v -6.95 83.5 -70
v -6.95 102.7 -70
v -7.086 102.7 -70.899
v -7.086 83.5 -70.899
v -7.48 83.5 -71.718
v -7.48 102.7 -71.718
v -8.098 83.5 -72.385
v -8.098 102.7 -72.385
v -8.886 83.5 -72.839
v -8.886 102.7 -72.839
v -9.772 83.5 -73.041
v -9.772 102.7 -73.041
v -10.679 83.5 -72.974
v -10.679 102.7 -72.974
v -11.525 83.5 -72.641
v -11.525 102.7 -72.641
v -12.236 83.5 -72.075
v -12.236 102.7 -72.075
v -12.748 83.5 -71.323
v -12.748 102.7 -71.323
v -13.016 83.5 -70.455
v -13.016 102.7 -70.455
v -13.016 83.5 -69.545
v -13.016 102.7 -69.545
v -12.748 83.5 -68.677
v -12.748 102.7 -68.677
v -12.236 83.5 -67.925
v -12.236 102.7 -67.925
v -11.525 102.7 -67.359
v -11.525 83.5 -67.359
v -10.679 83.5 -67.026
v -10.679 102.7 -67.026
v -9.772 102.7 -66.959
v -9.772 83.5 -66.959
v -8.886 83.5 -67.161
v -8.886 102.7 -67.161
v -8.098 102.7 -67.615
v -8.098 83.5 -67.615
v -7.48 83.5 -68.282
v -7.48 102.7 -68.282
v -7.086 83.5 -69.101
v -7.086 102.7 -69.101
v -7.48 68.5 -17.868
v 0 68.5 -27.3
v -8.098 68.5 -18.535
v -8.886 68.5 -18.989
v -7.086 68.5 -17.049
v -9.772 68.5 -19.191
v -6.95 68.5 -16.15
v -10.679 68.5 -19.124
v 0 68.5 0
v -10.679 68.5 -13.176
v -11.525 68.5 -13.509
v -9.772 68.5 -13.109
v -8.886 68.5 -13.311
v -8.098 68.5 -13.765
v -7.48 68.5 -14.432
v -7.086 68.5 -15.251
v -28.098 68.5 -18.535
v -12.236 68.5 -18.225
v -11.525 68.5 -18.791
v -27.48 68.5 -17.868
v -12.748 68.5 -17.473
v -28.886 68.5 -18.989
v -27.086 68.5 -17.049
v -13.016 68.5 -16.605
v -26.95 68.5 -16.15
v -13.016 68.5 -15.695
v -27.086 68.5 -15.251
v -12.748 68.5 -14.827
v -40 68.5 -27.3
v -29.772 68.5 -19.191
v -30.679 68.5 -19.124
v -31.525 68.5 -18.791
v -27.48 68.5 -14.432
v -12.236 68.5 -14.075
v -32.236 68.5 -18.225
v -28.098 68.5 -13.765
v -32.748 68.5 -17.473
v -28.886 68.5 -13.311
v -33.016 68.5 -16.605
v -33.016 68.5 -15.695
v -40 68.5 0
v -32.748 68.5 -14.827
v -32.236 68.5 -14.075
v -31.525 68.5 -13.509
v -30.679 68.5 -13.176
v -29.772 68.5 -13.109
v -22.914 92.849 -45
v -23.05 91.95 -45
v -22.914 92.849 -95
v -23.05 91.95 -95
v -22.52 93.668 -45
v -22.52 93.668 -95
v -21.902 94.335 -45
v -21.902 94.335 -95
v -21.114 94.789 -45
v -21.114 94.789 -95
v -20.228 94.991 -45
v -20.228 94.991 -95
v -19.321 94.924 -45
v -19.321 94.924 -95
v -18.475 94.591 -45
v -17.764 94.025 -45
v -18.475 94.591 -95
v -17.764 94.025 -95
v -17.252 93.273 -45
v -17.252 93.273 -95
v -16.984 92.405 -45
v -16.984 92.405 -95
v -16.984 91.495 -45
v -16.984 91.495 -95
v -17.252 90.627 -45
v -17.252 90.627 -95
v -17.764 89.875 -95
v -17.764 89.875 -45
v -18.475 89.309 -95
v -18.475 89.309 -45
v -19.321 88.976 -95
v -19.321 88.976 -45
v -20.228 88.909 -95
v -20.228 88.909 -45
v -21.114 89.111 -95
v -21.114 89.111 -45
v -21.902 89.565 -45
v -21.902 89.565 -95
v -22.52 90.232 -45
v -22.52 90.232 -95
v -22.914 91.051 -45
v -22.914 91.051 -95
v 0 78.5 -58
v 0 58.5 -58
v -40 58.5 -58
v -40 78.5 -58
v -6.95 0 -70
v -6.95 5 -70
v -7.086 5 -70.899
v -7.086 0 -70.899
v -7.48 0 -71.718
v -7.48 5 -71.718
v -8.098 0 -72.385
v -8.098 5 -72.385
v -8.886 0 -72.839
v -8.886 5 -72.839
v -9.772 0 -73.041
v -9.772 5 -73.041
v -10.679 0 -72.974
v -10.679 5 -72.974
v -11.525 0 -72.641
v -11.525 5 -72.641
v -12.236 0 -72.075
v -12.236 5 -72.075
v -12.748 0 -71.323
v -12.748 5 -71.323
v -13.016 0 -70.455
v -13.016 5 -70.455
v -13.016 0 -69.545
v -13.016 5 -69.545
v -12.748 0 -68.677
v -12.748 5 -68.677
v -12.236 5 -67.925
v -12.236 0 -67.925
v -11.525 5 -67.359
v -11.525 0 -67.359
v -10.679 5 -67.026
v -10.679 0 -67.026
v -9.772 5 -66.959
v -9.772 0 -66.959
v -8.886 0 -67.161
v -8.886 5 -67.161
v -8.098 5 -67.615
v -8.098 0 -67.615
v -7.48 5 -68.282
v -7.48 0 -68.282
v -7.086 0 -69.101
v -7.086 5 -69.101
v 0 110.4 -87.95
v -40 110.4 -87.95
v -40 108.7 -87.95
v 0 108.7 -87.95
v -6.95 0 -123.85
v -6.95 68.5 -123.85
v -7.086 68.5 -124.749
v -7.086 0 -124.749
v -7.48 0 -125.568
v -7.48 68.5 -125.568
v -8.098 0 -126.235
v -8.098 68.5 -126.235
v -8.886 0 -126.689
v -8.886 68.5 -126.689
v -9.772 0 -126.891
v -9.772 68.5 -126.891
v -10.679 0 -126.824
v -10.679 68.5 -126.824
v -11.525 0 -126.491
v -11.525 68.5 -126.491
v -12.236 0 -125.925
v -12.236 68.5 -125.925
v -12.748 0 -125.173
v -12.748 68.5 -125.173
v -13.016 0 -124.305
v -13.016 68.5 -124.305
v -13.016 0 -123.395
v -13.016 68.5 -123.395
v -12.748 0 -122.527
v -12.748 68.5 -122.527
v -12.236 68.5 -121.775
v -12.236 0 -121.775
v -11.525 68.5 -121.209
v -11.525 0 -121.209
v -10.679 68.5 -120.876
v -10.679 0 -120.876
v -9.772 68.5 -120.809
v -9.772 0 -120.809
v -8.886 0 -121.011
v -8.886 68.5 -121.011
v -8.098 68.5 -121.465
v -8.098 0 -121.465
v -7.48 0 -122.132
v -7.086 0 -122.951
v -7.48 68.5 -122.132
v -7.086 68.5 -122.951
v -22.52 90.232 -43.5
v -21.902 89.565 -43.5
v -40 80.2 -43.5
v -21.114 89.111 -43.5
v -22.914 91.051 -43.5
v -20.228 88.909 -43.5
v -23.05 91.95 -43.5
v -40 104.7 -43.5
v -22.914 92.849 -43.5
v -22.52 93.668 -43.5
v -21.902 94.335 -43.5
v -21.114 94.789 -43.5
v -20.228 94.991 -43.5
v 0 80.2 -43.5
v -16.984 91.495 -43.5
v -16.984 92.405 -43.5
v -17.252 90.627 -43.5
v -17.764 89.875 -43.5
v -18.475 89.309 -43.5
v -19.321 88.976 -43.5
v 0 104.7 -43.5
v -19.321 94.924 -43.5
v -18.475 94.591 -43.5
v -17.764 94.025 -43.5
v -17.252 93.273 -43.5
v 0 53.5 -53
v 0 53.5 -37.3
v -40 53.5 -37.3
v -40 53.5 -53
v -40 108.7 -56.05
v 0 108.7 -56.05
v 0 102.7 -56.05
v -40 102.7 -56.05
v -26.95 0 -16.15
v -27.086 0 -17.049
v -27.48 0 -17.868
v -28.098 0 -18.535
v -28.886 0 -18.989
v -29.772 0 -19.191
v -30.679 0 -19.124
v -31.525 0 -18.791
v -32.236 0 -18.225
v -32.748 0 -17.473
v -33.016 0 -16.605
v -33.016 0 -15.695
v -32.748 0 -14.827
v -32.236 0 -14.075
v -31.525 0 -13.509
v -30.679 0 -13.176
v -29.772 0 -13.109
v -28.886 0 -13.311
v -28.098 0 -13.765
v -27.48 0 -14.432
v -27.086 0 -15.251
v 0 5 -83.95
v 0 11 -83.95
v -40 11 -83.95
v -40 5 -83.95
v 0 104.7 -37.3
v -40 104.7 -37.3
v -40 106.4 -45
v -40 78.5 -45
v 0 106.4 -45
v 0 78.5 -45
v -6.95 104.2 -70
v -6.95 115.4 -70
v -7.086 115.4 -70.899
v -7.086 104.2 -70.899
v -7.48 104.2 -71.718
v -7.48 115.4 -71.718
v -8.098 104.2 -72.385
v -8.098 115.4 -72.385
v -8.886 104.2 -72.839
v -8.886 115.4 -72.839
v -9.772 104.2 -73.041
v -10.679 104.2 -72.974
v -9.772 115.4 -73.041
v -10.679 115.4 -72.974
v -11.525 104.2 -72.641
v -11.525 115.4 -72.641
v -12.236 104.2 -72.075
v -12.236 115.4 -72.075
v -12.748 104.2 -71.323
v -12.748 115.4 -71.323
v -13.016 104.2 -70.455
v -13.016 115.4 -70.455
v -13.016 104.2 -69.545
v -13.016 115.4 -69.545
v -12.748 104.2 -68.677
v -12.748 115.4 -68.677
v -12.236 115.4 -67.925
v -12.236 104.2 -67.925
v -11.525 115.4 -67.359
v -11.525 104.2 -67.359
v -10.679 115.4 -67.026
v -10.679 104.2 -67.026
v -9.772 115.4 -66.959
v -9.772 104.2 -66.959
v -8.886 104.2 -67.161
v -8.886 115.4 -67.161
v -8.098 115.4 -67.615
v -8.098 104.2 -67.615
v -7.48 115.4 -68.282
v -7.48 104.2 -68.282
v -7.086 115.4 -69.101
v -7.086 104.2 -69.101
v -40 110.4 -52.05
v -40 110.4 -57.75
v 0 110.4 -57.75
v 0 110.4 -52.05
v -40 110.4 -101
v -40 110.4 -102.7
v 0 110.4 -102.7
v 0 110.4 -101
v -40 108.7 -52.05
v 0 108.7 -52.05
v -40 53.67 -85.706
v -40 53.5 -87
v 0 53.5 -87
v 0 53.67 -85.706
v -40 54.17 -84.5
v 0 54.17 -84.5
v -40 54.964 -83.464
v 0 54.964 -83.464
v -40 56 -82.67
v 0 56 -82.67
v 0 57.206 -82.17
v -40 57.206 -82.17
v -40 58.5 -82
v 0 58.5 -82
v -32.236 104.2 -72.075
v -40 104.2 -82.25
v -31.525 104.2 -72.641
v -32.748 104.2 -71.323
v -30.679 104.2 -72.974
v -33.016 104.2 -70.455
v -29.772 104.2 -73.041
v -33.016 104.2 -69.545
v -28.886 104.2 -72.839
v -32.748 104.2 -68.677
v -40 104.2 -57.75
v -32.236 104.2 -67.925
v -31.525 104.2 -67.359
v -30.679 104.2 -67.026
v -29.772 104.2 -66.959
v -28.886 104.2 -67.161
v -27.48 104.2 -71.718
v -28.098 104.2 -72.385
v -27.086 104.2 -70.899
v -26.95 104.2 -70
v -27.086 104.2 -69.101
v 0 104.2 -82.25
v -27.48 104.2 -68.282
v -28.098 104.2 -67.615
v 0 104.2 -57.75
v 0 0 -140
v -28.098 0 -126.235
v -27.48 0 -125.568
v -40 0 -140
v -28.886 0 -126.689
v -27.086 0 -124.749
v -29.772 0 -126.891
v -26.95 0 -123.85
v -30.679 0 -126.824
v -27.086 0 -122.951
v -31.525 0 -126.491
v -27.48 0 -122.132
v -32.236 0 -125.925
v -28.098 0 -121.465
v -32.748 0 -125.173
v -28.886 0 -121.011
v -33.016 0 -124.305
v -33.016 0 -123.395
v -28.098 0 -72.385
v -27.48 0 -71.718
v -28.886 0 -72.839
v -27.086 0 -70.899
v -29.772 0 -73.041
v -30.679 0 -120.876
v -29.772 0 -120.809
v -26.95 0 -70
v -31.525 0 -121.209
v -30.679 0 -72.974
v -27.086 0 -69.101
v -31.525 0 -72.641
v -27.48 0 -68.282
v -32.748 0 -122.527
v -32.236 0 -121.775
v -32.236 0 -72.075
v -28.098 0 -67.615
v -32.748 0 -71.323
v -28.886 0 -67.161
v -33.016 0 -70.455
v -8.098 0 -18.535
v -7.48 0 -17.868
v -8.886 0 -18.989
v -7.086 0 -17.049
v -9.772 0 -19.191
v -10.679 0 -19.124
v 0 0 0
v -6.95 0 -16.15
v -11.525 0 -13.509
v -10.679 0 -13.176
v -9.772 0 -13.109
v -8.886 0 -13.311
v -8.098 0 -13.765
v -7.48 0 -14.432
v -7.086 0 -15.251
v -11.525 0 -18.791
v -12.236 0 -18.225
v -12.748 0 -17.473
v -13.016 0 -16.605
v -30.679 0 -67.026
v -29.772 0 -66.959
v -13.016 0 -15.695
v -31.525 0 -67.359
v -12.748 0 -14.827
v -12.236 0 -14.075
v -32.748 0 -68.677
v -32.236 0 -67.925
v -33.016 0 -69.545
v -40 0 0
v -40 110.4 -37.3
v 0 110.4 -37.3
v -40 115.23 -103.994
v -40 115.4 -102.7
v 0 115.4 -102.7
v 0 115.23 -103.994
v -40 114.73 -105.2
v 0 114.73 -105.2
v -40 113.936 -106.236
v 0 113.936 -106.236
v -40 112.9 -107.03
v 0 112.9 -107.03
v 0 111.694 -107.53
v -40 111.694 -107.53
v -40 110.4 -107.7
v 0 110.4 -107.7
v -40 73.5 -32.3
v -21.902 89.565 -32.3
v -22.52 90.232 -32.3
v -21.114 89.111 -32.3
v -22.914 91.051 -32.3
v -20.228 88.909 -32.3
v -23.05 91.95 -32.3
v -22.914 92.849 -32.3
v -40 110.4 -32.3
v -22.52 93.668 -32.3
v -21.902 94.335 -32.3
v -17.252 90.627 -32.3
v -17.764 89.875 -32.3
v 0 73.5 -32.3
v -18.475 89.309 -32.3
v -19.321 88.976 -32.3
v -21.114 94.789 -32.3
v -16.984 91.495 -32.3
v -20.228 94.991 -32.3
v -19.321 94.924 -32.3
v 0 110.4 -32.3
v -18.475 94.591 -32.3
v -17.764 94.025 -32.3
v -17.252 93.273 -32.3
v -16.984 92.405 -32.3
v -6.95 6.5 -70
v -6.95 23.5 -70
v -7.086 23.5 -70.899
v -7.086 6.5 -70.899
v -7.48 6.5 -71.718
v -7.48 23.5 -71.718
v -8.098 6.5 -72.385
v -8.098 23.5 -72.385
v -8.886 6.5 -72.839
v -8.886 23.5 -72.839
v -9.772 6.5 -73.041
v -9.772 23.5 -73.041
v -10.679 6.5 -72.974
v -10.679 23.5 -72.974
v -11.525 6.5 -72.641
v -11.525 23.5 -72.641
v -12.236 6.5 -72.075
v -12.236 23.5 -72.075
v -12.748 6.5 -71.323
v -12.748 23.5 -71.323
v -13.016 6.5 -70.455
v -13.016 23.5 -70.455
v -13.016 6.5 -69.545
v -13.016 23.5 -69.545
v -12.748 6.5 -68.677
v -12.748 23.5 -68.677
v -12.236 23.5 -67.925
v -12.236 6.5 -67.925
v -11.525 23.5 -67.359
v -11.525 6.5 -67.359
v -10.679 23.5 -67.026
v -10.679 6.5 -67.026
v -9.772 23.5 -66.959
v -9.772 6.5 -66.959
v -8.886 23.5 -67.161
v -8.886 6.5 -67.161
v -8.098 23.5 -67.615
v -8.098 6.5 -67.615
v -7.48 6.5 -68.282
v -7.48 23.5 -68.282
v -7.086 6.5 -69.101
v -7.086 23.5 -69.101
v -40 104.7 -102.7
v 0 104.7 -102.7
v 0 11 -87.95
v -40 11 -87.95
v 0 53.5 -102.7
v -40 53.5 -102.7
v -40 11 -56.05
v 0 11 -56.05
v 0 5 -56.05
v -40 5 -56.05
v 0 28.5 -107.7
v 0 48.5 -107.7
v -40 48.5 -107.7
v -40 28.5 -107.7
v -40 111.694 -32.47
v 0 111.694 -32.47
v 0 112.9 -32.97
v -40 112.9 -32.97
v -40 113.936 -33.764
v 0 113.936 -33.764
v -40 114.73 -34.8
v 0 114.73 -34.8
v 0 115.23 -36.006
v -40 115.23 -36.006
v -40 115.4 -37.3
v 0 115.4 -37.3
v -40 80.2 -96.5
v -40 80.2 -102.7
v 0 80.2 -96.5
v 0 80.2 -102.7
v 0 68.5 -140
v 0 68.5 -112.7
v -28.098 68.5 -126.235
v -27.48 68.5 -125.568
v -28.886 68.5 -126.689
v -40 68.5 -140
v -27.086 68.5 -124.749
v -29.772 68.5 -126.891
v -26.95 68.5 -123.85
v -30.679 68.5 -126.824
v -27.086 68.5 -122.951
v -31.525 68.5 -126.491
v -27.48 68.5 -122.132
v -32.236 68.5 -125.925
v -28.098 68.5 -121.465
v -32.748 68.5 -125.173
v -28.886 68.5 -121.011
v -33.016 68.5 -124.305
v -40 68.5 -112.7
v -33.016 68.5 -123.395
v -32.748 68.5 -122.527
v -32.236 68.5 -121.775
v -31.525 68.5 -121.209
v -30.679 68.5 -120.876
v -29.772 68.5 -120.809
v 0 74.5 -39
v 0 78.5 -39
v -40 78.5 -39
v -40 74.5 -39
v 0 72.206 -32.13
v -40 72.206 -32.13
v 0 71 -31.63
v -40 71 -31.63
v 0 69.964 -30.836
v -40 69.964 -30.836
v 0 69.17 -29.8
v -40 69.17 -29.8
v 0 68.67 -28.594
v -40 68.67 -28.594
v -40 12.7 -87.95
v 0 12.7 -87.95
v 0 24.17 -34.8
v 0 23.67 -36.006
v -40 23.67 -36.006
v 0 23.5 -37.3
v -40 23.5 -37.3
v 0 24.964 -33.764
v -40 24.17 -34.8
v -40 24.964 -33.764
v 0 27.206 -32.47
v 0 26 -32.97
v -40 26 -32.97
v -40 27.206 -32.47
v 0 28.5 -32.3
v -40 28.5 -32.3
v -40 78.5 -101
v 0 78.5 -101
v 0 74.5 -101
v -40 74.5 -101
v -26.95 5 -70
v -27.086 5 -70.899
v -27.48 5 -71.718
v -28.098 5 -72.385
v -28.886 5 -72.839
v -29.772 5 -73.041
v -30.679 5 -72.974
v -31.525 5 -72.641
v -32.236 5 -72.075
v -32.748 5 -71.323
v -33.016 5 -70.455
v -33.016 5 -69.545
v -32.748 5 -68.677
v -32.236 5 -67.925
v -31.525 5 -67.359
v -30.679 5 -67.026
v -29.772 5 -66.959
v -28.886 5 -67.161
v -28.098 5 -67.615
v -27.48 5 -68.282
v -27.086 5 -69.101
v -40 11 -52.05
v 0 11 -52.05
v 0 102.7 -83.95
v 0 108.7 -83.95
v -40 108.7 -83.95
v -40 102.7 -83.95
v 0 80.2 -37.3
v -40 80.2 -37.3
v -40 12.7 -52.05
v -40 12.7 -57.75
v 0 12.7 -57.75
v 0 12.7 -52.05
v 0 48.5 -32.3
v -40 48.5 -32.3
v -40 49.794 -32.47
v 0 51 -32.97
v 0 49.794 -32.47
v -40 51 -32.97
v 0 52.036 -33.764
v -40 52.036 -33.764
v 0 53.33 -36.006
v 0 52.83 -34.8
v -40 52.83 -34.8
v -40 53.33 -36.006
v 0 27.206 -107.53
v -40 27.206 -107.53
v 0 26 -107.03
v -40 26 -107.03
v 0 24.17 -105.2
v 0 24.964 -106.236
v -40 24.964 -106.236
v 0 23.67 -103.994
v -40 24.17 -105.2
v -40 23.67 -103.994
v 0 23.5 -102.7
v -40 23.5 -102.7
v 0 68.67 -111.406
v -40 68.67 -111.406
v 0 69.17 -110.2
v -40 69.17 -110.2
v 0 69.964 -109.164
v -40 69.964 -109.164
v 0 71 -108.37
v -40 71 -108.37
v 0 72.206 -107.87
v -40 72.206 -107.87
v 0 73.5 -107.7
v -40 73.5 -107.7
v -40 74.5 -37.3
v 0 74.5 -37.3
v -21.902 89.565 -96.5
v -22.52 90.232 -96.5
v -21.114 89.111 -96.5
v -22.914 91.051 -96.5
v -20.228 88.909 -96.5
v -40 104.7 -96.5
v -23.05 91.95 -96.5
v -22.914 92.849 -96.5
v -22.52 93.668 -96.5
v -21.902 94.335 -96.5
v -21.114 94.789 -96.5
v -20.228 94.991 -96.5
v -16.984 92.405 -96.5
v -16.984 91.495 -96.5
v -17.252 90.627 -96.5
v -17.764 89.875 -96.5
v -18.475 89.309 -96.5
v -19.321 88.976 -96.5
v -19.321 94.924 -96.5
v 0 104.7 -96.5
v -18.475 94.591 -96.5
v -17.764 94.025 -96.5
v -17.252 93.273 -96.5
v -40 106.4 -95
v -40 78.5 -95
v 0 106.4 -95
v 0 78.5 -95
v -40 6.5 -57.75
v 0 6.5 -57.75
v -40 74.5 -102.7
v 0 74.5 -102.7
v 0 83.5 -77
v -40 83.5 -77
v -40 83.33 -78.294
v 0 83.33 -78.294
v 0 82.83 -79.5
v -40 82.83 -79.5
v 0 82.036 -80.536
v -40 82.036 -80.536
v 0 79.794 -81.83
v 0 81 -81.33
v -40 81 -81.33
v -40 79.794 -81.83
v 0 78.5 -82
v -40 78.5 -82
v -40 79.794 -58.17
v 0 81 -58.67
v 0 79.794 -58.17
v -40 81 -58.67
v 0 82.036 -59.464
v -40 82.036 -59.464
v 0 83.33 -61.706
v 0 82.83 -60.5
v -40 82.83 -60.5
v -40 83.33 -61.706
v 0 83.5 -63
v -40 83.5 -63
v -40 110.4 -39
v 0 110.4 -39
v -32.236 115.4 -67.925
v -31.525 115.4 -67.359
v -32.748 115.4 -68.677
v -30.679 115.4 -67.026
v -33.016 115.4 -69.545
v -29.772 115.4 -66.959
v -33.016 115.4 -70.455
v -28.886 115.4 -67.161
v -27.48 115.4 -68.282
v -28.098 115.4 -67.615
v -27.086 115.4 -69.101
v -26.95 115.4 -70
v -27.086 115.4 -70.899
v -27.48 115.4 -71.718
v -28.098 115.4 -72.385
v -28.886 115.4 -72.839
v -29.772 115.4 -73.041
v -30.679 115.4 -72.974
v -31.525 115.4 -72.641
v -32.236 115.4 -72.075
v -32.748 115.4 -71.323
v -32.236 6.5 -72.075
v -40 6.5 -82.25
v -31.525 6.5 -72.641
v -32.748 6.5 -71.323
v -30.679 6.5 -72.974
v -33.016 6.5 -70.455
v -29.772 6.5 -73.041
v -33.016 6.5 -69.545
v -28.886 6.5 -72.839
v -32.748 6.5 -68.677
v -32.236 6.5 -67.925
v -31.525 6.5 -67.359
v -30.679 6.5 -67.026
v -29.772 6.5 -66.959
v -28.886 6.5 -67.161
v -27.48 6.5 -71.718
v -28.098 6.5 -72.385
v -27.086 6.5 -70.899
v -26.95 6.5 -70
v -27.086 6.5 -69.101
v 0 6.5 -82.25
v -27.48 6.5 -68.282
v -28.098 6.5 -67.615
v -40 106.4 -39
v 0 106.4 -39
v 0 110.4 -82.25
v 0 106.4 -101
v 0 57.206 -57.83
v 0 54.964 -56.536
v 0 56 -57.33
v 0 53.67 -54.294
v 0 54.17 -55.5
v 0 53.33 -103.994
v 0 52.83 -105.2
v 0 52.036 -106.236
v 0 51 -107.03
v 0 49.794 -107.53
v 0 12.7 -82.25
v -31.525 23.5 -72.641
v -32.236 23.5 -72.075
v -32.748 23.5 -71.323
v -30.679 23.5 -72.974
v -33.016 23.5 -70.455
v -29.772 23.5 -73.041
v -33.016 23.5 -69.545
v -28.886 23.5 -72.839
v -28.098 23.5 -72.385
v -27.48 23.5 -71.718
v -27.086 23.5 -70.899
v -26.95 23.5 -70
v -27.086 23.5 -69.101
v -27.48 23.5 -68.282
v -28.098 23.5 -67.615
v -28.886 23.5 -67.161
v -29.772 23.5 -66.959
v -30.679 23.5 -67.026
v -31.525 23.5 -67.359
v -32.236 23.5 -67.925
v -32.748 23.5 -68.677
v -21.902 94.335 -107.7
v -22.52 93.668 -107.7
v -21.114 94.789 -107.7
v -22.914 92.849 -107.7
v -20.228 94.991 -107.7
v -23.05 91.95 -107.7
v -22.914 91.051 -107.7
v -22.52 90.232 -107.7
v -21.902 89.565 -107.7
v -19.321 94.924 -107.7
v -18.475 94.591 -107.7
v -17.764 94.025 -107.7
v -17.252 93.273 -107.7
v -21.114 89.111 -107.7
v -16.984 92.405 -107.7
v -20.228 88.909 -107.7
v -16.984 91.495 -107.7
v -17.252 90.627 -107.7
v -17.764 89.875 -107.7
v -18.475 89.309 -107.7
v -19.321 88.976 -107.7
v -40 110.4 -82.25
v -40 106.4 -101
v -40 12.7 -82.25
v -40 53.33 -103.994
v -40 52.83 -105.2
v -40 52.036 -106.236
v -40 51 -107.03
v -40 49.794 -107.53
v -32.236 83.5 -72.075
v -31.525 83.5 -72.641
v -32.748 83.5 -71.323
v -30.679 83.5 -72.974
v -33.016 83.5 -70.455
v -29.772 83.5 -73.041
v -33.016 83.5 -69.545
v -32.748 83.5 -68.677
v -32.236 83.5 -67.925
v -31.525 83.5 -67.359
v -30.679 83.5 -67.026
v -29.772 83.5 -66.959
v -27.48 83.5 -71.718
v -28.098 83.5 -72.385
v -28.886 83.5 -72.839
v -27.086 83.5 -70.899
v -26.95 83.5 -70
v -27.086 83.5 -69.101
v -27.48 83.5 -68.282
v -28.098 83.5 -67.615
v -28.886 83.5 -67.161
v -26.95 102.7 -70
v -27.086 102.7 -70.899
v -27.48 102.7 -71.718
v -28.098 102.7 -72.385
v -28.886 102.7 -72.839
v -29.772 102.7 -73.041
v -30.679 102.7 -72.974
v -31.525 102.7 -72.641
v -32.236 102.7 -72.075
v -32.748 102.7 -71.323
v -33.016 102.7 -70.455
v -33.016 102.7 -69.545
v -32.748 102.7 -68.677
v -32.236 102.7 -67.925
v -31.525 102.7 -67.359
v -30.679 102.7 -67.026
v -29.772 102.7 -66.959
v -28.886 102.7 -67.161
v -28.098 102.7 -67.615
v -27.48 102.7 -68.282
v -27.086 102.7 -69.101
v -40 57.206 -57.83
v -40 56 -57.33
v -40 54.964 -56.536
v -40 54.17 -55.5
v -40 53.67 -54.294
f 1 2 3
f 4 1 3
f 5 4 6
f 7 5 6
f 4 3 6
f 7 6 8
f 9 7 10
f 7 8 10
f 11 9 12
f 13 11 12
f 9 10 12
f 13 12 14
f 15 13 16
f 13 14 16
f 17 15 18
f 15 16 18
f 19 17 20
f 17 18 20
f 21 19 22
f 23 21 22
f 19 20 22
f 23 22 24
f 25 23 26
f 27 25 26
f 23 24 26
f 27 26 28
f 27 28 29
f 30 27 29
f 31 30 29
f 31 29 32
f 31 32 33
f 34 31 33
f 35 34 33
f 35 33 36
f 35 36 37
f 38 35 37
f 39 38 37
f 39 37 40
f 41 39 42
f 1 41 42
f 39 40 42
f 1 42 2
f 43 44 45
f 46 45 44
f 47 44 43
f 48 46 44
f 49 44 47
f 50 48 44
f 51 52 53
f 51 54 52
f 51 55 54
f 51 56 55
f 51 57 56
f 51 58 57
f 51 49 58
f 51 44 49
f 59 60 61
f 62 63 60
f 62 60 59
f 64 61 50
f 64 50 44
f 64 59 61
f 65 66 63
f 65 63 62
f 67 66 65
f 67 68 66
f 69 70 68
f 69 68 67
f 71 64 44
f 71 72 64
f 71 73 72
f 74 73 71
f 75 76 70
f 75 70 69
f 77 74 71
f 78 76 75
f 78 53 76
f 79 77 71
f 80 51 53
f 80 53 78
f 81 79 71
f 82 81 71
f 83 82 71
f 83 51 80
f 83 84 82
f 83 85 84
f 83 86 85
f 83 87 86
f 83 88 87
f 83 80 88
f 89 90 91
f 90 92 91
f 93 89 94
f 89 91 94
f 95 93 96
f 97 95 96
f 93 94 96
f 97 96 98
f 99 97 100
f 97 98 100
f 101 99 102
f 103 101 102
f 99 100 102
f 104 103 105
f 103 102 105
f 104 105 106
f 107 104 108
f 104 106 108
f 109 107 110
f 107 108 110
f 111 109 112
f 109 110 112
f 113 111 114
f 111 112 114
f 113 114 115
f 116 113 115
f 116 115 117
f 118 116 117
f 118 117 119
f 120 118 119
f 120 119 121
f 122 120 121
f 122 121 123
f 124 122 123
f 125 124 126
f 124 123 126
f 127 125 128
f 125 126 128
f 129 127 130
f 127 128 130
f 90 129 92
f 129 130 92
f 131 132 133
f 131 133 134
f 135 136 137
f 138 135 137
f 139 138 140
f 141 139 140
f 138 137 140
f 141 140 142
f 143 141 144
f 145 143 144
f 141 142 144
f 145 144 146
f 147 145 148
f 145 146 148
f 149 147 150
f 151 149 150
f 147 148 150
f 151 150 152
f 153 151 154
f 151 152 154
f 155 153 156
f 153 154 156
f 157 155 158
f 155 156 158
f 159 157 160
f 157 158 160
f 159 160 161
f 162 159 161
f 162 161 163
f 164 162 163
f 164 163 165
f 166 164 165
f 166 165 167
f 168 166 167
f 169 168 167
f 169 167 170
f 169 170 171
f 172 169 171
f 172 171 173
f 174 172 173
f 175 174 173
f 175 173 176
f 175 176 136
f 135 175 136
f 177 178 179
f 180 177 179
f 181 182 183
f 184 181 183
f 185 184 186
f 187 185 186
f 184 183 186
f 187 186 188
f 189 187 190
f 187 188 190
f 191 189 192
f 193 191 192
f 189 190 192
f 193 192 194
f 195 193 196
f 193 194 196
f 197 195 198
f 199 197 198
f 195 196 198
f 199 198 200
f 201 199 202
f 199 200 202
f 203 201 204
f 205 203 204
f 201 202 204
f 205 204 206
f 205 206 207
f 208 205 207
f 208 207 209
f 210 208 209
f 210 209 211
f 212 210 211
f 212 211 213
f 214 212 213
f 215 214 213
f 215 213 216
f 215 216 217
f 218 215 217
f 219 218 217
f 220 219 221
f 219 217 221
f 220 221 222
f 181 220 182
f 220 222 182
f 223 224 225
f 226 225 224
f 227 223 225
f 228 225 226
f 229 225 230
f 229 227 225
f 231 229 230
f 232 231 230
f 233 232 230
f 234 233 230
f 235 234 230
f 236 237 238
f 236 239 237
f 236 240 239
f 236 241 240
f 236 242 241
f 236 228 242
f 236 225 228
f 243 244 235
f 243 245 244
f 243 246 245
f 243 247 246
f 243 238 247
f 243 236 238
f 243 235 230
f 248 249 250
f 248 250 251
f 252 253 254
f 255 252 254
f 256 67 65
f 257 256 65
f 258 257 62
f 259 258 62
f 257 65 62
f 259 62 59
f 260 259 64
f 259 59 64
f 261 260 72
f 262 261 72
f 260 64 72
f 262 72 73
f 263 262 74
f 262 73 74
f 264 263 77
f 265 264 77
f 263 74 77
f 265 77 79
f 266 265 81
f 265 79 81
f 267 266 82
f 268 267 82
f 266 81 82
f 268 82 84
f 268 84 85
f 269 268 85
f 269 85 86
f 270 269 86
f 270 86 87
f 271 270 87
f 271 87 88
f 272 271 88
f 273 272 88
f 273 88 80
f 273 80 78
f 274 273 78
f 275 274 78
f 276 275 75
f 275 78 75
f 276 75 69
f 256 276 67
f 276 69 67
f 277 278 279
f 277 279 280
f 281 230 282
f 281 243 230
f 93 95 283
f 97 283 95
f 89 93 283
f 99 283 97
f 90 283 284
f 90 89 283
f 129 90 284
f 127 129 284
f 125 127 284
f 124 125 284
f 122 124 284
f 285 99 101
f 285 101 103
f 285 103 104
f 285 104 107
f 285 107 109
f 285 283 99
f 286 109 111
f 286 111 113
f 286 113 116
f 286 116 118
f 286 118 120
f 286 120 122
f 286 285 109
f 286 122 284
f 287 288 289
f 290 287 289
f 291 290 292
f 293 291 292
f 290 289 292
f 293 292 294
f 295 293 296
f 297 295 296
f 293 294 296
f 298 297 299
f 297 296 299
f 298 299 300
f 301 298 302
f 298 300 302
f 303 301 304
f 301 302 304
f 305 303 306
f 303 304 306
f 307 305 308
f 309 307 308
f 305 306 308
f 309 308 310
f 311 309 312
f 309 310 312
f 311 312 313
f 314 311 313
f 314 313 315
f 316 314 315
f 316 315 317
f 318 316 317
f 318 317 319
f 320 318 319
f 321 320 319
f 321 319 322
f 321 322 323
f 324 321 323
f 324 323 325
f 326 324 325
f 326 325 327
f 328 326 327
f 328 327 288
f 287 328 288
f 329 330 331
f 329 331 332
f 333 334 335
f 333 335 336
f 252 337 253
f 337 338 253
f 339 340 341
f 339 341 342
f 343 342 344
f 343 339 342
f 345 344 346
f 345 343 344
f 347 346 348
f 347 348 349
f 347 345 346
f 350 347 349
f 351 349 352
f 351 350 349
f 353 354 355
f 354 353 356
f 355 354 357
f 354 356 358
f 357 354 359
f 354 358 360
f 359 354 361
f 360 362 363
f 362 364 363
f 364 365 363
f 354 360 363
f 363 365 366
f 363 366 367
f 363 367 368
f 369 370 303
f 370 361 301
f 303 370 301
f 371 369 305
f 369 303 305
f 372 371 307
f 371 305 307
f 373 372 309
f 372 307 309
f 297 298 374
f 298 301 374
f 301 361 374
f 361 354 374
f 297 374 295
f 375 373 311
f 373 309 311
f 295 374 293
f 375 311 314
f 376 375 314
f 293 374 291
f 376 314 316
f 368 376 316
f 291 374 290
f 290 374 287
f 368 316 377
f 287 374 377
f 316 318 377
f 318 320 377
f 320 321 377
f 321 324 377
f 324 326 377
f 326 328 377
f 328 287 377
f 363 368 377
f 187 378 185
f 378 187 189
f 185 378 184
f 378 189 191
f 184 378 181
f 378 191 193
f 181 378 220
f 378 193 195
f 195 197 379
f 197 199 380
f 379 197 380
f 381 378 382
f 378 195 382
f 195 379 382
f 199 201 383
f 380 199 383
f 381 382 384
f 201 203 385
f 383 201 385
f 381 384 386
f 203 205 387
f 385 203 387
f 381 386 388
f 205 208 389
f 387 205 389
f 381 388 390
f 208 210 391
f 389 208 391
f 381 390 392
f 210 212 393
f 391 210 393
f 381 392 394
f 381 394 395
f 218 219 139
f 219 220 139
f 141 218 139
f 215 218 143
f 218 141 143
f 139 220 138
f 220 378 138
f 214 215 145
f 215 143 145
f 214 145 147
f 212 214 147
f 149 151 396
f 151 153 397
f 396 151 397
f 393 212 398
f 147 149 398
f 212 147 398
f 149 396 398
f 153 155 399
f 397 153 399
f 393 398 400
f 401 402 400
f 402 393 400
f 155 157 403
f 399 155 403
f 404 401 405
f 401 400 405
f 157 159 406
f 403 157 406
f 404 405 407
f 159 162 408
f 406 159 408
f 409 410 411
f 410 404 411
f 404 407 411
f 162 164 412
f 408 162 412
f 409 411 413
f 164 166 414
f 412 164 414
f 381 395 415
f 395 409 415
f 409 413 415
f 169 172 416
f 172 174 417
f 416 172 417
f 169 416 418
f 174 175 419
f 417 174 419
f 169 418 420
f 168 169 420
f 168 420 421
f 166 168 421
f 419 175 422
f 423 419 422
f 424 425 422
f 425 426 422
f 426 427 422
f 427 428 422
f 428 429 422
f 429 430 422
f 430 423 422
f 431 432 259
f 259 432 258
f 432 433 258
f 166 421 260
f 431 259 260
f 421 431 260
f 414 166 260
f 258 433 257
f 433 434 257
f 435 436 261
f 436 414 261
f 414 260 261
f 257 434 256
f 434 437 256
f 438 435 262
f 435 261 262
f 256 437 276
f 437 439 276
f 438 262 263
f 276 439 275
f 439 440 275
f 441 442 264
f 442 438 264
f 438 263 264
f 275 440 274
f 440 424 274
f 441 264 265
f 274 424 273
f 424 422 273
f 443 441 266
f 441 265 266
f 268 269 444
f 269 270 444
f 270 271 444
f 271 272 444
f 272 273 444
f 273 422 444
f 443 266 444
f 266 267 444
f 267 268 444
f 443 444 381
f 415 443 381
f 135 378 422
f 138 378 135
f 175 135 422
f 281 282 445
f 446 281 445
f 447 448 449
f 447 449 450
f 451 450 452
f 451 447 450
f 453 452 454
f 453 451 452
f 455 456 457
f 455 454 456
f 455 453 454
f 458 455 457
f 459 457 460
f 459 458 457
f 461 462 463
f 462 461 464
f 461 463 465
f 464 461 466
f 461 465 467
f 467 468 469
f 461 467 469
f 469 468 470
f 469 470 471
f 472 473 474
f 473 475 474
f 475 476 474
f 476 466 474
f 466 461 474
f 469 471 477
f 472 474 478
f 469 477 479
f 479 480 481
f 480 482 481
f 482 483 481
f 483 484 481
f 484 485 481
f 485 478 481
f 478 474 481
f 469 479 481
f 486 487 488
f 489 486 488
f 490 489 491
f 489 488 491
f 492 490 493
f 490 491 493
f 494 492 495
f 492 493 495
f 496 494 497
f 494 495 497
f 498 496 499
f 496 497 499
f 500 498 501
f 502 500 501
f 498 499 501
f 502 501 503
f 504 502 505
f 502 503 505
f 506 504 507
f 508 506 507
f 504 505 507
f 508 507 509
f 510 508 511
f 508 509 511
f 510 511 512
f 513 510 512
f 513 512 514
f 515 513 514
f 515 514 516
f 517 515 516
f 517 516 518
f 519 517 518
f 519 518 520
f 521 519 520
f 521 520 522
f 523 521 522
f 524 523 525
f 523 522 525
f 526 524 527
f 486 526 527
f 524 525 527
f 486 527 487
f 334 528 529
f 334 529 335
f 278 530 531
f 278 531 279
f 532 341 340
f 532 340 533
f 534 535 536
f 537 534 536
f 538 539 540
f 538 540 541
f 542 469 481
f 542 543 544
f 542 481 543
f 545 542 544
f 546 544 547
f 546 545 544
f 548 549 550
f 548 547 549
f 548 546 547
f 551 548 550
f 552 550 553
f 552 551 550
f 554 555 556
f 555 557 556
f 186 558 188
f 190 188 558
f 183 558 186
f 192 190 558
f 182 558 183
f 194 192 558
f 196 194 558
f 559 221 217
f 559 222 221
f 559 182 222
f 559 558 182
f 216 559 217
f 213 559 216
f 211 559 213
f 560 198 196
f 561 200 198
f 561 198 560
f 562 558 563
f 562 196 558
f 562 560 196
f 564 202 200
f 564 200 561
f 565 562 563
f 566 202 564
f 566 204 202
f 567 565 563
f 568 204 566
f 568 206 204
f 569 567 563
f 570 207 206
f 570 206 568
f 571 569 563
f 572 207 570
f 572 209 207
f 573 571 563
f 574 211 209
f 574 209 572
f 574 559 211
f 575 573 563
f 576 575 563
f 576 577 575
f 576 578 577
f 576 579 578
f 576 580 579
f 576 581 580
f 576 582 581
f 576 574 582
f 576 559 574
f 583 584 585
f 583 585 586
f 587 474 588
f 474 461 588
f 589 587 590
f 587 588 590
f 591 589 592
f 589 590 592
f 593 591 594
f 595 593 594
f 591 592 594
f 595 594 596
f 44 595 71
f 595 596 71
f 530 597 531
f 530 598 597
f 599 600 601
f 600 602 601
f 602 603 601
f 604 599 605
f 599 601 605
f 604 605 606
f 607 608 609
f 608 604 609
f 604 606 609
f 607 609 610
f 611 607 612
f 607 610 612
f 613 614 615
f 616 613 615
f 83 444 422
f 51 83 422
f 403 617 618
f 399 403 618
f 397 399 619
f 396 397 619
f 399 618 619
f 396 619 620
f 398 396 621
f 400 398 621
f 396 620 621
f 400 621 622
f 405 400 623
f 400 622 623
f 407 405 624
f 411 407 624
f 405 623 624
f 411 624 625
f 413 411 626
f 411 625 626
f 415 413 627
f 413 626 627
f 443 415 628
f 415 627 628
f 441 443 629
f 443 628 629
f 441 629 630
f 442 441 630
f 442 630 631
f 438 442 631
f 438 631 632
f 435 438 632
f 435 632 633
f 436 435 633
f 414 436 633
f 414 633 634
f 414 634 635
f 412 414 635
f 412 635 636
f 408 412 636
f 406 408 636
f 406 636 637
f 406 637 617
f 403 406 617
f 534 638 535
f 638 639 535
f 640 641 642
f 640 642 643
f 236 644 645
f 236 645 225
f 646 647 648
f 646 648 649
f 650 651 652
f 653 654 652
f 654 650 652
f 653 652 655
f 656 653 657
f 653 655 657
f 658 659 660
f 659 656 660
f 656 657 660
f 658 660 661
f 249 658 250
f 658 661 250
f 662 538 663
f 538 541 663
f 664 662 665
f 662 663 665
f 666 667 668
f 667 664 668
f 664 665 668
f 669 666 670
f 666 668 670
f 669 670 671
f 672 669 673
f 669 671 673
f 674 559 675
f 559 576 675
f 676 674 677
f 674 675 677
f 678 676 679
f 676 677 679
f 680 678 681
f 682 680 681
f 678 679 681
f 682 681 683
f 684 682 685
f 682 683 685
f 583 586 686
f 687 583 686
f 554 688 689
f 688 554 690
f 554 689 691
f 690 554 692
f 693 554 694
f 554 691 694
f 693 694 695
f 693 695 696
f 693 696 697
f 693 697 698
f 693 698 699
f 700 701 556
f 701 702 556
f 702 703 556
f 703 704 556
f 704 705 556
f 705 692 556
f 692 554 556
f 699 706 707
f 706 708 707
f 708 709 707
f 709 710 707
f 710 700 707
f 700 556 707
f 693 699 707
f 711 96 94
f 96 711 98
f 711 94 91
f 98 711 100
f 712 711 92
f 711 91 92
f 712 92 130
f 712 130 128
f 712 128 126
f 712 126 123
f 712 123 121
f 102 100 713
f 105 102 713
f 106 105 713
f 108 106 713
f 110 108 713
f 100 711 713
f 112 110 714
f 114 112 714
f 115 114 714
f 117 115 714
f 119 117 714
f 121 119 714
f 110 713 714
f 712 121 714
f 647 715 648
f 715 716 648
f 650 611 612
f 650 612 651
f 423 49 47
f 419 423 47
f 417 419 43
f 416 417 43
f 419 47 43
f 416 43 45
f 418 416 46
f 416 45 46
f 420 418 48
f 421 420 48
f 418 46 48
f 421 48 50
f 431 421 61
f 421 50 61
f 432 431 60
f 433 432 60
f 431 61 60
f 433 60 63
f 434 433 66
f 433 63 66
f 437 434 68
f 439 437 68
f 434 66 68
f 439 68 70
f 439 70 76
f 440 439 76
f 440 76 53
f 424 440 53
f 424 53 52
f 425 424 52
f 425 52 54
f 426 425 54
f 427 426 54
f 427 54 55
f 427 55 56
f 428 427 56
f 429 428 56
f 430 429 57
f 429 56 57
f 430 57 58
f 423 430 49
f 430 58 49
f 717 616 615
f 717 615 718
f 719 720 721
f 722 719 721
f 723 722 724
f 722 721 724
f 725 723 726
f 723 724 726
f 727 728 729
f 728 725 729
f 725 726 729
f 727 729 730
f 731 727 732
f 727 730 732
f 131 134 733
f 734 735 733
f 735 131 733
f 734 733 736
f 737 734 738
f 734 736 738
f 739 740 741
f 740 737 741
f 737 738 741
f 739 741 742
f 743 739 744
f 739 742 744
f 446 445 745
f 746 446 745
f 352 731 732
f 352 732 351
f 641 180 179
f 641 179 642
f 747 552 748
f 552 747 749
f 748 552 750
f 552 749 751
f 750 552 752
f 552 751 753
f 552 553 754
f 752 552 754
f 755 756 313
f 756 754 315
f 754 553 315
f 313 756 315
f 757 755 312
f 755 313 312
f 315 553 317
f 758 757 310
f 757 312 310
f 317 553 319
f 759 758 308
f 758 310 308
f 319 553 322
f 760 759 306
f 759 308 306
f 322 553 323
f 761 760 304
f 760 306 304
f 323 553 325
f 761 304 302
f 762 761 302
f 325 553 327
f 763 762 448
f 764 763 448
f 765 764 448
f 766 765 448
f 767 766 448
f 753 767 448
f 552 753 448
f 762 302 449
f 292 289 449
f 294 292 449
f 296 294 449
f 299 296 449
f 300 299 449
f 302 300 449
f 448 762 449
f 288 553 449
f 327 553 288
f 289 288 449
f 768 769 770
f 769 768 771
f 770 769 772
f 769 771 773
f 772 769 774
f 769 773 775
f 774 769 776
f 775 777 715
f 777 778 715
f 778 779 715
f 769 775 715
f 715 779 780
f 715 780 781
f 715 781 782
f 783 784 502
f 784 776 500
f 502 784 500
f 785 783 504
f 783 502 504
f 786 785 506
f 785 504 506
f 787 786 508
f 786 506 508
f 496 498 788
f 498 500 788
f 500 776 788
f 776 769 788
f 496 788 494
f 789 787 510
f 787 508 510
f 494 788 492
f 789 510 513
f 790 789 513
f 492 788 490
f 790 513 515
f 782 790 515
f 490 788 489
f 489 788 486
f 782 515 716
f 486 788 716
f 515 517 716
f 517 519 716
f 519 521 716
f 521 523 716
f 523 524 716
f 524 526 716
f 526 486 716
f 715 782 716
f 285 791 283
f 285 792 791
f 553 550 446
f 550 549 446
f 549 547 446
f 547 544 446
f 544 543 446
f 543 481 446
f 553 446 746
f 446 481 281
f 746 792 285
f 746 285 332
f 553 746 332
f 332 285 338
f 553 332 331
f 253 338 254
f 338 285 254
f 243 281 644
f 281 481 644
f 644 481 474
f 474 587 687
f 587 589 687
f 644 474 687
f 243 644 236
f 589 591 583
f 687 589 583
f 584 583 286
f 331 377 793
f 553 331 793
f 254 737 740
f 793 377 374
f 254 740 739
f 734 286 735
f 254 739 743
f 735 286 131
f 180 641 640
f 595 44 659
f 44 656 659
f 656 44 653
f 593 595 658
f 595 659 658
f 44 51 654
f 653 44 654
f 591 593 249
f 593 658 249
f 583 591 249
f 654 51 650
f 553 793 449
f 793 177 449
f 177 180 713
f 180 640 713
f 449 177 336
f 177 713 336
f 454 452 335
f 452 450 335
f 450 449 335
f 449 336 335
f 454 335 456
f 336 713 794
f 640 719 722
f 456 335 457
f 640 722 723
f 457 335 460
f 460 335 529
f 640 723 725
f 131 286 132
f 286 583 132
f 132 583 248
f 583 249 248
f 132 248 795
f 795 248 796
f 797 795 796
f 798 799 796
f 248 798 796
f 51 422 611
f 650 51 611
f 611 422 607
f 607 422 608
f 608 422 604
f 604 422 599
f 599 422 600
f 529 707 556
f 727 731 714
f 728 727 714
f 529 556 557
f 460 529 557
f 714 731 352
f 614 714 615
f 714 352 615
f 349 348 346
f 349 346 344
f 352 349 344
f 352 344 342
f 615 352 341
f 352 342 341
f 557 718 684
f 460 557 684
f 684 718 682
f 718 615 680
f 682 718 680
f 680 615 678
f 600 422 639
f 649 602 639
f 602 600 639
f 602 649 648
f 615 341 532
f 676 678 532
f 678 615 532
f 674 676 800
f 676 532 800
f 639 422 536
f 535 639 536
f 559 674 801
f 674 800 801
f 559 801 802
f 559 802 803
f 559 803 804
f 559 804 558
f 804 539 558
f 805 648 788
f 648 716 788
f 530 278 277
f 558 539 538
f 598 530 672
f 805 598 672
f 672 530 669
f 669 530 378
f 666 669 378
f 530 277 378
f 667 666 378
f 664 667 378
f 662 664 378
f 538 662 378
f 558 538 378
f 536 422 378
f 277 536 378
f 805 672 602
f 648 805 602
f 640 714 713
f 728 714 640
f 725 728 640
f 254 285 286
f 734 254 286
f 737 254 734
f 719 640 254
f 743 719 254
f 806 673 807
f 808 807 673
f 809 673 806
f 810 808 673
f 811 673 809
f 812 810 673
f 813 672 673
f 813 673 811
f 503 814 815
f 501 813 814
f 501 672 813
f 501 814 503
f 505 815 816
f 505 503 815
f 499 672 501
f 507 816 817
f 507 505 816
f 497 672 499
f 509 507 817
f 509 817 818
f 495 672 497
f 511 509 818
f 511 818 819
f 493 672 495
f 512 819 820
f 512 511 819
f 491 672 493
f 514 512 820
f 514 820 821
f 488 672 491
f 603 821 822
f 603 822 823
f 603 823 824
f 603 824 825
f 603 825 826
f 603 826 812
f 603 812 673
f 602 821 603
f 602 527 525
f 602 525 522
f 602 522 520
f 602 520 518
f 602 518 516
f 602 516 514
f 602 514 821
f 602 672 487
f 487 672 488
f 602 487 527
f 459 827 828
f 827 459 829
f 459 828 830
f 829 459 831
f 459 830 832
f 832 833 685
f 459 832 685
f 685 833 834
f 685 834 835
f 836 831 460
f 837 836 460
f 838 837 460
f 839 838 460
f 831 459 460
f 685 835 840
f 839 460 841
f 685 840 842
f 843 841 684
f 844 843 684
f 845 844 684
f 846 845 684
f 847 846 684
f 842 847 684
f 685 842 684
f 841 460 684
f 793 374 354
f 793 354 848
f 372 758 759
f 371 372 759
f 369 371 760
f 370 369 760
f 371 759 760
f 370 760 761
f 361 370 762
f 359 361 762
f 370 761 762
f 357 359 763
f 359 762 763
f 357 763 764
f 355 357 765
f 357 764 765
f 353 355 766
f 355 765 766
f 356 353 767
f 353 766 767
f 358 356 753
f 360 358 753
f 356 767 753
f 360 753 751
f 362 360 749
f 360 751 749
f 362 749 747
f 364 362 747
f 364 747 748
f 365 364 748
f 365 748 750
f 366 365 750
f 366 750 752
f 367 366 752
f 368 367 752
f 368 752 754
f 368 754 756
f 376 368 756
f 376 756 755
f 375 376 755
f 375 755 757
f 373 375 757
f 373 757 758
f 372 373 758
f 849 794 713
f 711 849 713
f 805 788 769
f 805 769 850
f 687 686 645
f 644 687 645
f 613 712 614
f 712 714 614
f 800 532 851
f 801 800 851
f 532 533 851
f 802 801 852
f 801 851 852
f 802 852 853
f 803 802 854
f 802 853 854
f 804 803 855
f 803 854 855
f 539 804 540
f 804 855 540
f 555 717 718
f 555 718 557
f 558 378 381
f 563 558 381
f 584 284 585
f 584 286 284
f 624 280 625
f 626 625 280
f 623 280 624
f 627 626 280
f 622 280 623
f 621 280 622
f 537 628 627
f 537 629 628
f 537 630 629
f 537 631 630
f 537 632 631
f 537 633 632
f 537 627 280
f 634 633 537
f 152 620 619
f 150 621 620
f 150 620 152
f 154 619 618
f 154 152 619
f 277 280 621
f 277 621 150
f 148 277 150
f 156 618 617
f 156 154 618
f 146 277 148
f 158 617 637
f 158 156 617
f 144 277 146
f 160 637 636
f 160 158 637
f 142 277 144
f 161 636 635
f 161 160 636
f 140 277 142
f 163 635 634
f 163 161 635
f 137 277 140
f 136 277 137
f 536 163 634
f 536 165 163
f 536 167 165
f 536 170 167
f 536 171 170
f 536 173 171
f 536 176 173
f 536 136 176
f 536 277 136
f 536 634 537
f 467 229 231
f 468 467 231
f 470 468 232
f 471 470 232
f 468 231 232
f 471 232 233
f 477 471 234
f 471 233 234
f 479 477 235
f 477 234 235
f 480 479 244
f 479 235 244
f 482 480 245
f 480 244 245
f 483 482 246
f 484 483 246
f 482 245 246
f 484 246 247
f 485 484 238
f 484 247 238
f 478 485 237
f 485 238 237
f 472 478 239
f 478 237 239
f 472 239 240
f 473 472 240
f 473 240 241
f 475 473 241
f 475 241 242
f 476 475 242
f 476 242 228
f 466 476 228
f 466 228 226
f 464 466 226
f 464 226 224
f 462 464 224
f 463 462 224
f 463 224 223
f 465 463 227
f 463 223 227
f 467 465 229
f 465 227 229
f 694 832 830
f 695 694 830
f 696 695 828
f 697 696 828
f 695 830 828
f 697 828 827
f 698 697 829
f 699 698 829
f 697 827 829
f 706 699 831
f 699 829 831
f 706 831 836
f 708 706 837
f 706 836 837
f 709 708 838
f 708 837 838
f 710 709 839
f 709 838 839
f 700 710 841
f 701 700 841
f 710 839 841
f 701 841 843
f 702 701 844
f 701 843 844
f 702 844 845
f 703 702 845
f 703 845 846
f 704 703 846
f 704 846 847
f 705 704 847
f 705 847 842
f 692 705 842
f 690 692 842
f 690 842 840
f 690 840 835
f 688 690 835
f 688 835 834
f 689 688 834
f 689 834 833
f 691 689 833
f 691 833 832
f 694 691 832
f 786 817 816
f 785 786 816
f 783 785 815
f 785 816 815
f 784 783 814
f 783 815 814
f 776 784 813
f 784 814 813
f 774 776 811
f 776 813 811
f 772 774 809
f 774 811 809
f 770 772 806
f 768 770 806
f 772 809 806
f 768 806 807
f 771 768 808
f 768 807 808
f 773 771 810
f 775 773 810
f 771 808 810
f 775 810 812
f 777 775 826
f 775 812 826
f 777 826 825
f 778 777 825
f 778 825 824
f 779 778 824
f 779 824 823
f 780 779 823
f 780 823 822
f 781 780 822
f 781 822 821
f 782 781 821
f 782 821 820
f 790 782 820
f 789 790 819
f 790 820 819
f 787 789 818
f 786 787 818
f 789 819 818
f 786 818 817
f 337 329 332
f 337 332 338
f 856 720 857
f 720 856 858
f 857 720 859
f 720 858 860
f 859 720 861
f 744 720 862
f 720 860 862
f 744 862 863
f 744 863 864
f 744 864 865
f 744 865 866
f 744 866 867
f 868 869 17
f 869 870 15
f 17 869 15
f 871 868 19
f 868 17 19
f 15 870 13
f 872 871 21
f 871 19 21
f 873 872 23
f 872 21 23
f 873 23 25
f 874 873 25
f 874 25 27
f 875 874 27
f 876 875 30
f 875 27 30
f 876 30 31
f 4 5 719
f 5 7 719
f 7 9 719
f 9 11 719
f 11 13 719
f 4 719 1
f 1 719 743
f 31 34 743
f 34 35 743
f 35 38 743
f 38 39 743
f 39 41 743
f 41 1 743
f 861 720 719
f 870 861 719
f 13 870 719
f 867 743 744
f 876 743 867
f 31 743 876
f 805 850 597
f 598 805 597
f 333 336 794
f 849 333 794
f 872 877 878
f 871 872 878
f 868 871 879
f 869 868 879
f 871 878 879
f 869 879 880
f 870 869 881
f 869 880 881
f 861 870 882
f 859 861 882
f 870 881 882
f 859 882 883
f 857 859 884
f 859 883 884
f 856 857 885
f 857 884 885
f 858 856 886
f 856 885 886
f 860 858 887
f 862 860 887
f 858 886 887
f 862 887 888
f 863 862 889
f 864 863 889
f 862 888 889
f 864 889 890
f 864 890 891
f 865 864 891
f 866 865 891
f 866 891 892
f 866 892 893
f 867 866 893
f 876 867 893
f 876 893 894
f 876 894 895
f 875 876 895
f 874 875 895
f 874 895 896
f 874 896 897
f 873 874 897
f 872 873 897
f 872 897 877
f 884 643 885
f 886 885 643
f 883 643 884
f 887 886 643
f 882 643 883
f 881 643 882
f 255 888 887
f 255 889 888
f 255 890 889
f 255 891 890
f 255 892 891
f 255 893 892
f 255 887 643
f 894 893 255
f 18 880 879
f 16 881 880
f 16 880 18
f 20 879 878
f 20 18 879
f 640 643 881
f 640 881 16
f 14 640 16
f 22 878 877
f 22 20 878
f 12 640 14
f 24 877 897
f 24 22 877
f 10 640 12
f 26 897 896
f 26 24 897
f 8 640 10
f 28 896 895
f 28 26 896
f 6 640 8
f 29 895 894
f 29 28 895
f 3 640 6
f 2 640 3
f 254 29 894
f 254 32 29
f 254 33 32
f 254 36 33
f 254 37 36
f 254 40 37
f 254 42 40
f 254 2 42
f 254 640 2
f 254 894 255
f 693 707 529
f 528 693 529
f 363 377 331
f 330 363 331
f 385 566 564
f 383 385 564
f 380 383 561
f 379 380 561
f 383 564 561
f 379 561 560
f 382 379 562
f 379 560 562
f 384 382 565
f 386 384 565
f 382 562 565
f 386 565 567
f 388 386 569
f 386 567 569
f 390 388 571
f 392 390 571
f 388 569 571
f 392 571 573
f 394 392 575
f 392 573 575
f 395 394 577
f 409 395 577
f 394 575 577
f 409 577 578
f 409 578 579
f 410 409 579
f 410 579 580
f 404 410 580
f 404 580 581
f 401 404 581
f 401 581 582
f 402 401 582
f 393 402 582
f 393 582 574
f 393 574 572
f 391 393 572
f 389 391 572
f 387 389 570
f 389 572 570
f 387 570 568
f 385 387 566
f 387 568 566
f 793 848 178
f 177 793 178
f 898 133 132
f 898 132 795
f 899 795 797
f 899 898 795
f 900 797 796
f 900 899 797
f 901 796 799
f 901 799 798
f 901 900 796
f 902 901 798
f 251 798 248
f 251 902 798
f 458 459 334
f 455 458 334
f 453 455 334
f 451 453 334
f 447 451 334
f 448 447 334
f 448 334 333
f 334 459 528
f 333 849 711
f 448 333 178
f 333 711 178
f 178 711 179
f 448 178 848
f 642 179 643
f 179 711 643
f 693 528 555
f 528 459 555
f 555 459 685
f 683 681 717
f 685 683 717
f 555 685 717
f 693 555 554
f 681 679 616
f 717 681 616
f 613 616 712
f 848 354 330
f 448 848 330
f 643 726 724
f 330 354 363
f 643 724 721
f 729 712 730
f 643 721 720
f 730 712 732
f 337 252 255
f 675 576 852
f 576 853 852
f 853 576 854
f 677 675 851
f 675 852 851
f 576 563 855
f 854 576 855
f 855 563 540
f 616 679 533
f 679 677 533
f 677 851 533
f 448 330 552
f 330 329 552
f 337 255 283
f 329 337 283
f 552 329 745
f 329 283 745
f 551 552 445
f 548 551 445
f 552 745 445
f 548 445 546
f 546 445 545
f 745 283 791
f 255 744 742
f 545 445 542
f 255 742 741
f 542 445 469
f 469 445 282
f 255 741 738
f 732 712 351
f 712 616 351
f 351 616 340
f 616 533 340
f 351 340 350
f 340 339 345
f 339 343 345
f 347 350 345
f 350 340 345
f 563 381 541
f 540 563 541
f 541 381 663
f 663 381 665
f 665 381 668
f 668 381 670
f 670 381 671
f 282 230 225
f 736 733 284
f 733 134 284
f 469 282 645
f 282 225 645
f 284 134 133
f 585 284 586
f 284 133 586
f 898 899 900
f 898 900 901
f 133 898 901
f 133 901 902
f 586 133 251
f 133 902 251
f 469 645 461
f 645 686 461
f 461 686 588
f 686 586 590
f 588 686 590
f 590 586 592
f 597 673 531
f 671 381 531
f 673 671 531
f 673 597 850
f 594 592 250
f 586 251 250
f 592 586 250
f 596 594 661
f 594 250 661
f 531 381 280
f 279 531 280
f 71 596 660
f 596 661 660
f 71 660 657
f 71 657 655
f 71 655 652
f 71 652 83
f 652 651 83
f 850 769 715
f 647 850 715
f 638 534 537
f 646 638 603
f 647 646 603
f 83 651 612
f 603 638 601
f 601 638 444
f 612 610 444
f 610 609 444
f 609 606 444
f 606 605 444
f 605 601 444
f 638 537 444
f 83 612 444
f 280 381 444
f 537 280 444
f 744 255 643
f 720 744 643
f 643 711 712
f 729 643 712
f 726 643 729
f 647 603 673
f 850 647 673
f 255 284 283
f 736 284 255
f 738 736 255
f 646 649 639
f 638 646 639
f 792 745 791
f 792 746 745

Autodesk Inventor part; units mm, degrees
ref_plane "YZ Plane" through (0, 0, 0) normal (1, 0, 0) x (0, 1, 0)
ref_plane "XZ Plane" through (0, 0, 0) normal (0, 1, 0) x (-1, 0, 0)
ref_plane "XY Plane" through (0, 0, 0) normal (0, 0, 1) x (1, 0, 0)
sketch "Sketch1" plane through (0, 0, 0) normal (0, 1, 0) x (-1, 0, 0)
  line L0 (0, 0) -> (0, -140)
  line L1 (0, -140) -> (40, -140)
  line L2 (40, -140) -> (40, 0)
  line L3 (40, 0) -> (0, 0)
  dimension "d0" = 140
  dimension "d1" = 40
extrude "Extrusion1" add sketch "Sketch1" along normal blind 68.5
sketch "Sketch2" plane through (0, 0, 0) normal (1, 0, 0) x (0, 0, -1)
  line L0 (140, 68.5) -> (0, 68.5) projected
  line L1 (45, 78.5) -> (39, 78.5)
  line L2 (39, 78.5) -> (39, 74.5)
  line L3 (39, 74.5) -> (37.3, 74.5)
  line L4 (37.3, 74.5) -> (37.3, 80.2)
  line L5 (37.3, 80.2) -> (43.5, 80.2)
  line L6 (43.5, 80.2) -> (43.5, 104.7)
  line L7 (43.5, 104.7) -> (37.3, 104.7)
  line L8 (37.3, 104.7) -> (37.3, 110.4)
  line L9 (37.3, 110.4) -> (39, 110.4)
  line L10 (39, 110.4) -> (39, 106.4)
  line L11 (39, 106.4) -> (45, 106.4)
  line L12 (45, 106.4) -> (45, 78.5)
  line L13 (95, 78.5) -> (101, 78.5)
  line L14 (101, 78.5) -> (101, 74.5)
  line L15 (101, 74.5) -> (102.7, 74.5)
  line L16 (102.7, 74.5) -> (102.7, 80.2)
  line L17 (102.7, 80.2) -> (96.5, 80.2)
  line L18 (96.5, 80.2) -> (96.5, 104.7)
  line L19 (96.5, 104.7) -> (102.7, 104.7)
  line L20 (102.7, 104.7) -> (102.7, 110.4)
  line L21 (102.7, 110.4) -> (101, 110.4)
  line L22 (101, 110.4) -> (101, 106.4)
  line L23 (101, 106.4) -> (95, 106.4)
  line L24 (95, 106.4) -> (95, 78.5)
  line L25 (37.3, 68.5) -> (32.3, 68.5)
  line L26 (32.3, 68.5) -> (32.3, 110.4)
  line L27 (32.3, 110.4) -> (32.3, 115.4)
  line L28 (32.3, 115.4) -> (102.7, 115.4)
  line L29 (102.7, 115.4) -> (107.7, 115.4)
  line L30 (107.7, 115.4) -> (107.7, 68.5)
  line L31 (37.3, 68.5) -> (107.7, 68.5)
  point P0 (0, 0)
  dimension "d8" = 4
  dimension "d9" = 1.7
  dimension "d10" = 5.7
  dimension "d11" = 6.2
  dimension "d12" = 24.5
  dimension "d13" = 5.7
  dimension "d14" = 1.7
  dimension "d15" = 4
  dimension "d16" = 6
  dimension "d17" = 5
  dimension "d18" = 5
  dimension "d19" = 5
extrude "Extrusion2" add sketch "Sketch2" against normal up to surface (40 mm away)
sketch "Sketch3" plane through (0, 0, 0) normal (1, 0, 0) x (0, 0, -1)
  line L0 (87.95, 12.7) -> (87.95, 11)
  line L1 (87.95, 11) -> (83.95, 11)
  line L2 (83.95, 11) -> (83.95, 5)
  line L3 (83.95, 5) -> (70, 5)
  line L4 (70, 6.5) -> (82.25, 6.5)
  line L5 (82.25, 6.5) -> (82.25, 12.7)
  line L6 (82.25, 12.7) -> (87.95, 12.7)
  line L7 (52.05, 12.7) -> (52.05, 11)
  line L8 (52.05, 11) -> (56.05, 11)
  line L9 (56.05, 11) -> (56.05, 5)
  line L10 (56.05, 5) -> (70, 5)
  line L11 (70, 6.5) -> (57.75, 6.5)
  line L12 (57.75, 6.5) -> (57.75, 12.7)
  line L13 (57.75, 12.7) -> (52.05, 12.7)
  line L14 (107.7, 115.4) -> (32.3, 115.4) projected
  line L15 (87.95, 110.4) -> (87.95, 108.7)
  line L16 (87.95, 108.7) -> (83.95, 108.7)
  line L17 (83.95, 108.7) -> (83.95, 102.7)
  line L18 (83.95, 102.7) -> (70, 102.7)
  line L19 (70, 104.2) -> (82.25, 104.2)
  line L20 (82.25, 110.4) -> (87.95, 110.4)
  line L21 (52.05, 110.4) -> (52.05, 108.7)
  line L22 (52.05, 108.7) -> (56.05, 108.7)
  line L23 (56.05, 108.7) -> (56.05, 102.7)
  line L24 (56.05, 102.7) -> (70, 102.7)
  line L25 (70, 104.2) -> (57.75, 104.2)
  line L26 (57.75, 104.2) -> (57.75, 110.4)
  line L27 (57.75, 110.4) -> (52.05, 110.4)
  line L28 (82.25, 104.2) -> (82.25, 110.4)
  line L29 (140, 0) -> (0, 0) projected
  dimension "d27" = 6
  dimension "d31" = 6
extrude "Extrusion3" cut sketch "Sketch3" against normal up to surface (40 mm away)
sketch "Sketch4" plane through (0, 115.4, -32.3) normal (0, 1, 0) x (1, 0, 0)
  line L0 (-40, 75.4) -> (-40, 0) projected
  line L1 (0, 0) -> (-40, 0) projected
  line L2 (0, 75.4) -> (0, 0) projected
  line L3 (0, 75.4) -> (-40, 75.4) projected
  line L4 (0, -32.3) -> (0, 107.7) projected
  line L5 (-40, 107.7) -> (-40, -32.3) projected
  line L6 (-40, 75.4) -> (0, 75.4) projected
  line L7 (0, 0) -> (-40, 0) projected
  circle A0 centre (-30, 37.7) radius 3.05
  circle A1 centre (-10, 37.7) radius 3.05
  dimension "d48" = 6.1
  dimension "d49" = 6.1
sketch "Sketch5" plane through (0, 68.5, -107.7) normal (0, 0, -1) x (-1, 0, 0)
  line L0 (40, 0) -> (40, 46.9) projected
  line L1 (0, 46.9) -> (40, 46.9) projected
  line L2 (0, 0) -> (0, 46.9) projected
  line L3 (40, 0) -> (0, 0) projected
  line L4 (0, 46.9) -> (0, 0) projected
  line L5 (40, 36.2) -> (40, 11.7) projected
  line L6 (0, 46.9) -> (40, 46.9) projected
  circle A0 centre (20, 23.45) radius 3.05
  point P0 (0, -68.5)
sketch "Sketch6" plane through (0, 68.5, 0) normal (0, 1, 0) x (1, 0, 0)
  line L0 (-40, 107.7) -> (0, 107.7) projected
  line L1 (0, 107.7) -> (0, 140) projected
  line L2 (0, 140) -> (-40, 140) projected
  line L3 (-40, 140) -> (-40, 107.7) projected
  line L4 (0, 32.3) -> (-40, 32.3) projected
  line L5 (-40, 32.3) -> (-40, 0) projected
  line L6 (-40, 0) -> (0, 0) projected
  line L7 (0, 0) -> (0, 32.3) projected
  line L8 (0, 107.7) -> (0, 140) projected
  line L9 (-40, 140) -> (-40, 107.7) projected
  line L10 (0, 140) -> (-40, 140) projected
  line L11 (0, 32.3) -> (-40, 32.3) projected
  line L12 (-40, 0) -> (0, 0) projected
  line L13 (0, 0) -> (0, 140) projected
  line L14 (-40, 140) -> (-40, 0) projected
  circle A0 centre (-10, 123.85) radius 3.05
  circle A1 centre (-30, 123.85) radius 3.05
  circle A2 centre (-10, 16.15) radius 3.05
  circle A3 centre (-30, 16.15) radius 3.05
  dimension "d37" = 6.1
  dimension "d38" = 6.1
  dimension "d39" = 6.1
  dimension "d40" = 6.1
extrude "Extrusion4" cut sketch "Sketch6" against normal up to surface (68.5 mm away) contours A0 | A1 | A2 | A3
extrude "Extrusion5" cut sketch "Sketch4" against normal up to surface (115.4 mm away) contours A0 | A1
extrude "Extrusion6" cut sketch "Sketch5" against normal up to surface (75.4 mm away) contours A0
sketch "Sketch7" plane through (0, 0, 0) normal (1, 0, 0) x (0, 0, -1)
  line L0 (107.7, 53.5) -> (107.7, 23.5)
  line L1 (107.7, 23.5) -> (32.3, 23.5)
  line L2 (32.3, 23.5) -> (32.3, 53.5)
  line L3 (70, 23.5) -> (64, 23.5)
  line L4 (64, 23.5) -> (76, 23.5)
  line L5 (58, 53.5) -> (58, 93.5)
  line L6 (58, 93.5) -> (76, 93.5)
  line L7 (76, 93.5) -> (82, 93.5)
  line L8 (82, 93.5) -> (82, 53.5)
  line L9 (32.3, 53.5) -> (58, 53.5)
  line L10 (82, 53.5) -> (107.7, 53.5)
  line L11 (82, 93.5) -> (82, 83.5)
  line L12 (82, 83.5) -> (58, 83.5)
  point P0 (0, 0)
  dimension "d52" = 6
  dimension "d53" = 12
  dimension "d58" = 40
  dimension "d59" = 6
  dimension "d61" = 10
extrude "Extrusion7" cut sketch "Sketch7" against normal up to surface (40 mm away) contours L0 L1 L2 L9 L5 L12 L8 L10
fillet "Fillet1" radius 5 8 edges at (-20, 53.5, -82) (-20, 53.5, -58) (-20, 53.5, -32.3) (-20, 23.5, -32.3) (-20, 23.5, -107.7) (-20, 53.5, -107.7) (-20, 83.5, -58) (-20, 83.5, -82)
fillet "Fillet2" radius 5 4 edges at (-20, 115.4, -32.3) (-20, 68.5, -32.3) (-20, 115.4, -107.7) (-20, 68.5, -107.7)
properties part number "din_damper_connector"
